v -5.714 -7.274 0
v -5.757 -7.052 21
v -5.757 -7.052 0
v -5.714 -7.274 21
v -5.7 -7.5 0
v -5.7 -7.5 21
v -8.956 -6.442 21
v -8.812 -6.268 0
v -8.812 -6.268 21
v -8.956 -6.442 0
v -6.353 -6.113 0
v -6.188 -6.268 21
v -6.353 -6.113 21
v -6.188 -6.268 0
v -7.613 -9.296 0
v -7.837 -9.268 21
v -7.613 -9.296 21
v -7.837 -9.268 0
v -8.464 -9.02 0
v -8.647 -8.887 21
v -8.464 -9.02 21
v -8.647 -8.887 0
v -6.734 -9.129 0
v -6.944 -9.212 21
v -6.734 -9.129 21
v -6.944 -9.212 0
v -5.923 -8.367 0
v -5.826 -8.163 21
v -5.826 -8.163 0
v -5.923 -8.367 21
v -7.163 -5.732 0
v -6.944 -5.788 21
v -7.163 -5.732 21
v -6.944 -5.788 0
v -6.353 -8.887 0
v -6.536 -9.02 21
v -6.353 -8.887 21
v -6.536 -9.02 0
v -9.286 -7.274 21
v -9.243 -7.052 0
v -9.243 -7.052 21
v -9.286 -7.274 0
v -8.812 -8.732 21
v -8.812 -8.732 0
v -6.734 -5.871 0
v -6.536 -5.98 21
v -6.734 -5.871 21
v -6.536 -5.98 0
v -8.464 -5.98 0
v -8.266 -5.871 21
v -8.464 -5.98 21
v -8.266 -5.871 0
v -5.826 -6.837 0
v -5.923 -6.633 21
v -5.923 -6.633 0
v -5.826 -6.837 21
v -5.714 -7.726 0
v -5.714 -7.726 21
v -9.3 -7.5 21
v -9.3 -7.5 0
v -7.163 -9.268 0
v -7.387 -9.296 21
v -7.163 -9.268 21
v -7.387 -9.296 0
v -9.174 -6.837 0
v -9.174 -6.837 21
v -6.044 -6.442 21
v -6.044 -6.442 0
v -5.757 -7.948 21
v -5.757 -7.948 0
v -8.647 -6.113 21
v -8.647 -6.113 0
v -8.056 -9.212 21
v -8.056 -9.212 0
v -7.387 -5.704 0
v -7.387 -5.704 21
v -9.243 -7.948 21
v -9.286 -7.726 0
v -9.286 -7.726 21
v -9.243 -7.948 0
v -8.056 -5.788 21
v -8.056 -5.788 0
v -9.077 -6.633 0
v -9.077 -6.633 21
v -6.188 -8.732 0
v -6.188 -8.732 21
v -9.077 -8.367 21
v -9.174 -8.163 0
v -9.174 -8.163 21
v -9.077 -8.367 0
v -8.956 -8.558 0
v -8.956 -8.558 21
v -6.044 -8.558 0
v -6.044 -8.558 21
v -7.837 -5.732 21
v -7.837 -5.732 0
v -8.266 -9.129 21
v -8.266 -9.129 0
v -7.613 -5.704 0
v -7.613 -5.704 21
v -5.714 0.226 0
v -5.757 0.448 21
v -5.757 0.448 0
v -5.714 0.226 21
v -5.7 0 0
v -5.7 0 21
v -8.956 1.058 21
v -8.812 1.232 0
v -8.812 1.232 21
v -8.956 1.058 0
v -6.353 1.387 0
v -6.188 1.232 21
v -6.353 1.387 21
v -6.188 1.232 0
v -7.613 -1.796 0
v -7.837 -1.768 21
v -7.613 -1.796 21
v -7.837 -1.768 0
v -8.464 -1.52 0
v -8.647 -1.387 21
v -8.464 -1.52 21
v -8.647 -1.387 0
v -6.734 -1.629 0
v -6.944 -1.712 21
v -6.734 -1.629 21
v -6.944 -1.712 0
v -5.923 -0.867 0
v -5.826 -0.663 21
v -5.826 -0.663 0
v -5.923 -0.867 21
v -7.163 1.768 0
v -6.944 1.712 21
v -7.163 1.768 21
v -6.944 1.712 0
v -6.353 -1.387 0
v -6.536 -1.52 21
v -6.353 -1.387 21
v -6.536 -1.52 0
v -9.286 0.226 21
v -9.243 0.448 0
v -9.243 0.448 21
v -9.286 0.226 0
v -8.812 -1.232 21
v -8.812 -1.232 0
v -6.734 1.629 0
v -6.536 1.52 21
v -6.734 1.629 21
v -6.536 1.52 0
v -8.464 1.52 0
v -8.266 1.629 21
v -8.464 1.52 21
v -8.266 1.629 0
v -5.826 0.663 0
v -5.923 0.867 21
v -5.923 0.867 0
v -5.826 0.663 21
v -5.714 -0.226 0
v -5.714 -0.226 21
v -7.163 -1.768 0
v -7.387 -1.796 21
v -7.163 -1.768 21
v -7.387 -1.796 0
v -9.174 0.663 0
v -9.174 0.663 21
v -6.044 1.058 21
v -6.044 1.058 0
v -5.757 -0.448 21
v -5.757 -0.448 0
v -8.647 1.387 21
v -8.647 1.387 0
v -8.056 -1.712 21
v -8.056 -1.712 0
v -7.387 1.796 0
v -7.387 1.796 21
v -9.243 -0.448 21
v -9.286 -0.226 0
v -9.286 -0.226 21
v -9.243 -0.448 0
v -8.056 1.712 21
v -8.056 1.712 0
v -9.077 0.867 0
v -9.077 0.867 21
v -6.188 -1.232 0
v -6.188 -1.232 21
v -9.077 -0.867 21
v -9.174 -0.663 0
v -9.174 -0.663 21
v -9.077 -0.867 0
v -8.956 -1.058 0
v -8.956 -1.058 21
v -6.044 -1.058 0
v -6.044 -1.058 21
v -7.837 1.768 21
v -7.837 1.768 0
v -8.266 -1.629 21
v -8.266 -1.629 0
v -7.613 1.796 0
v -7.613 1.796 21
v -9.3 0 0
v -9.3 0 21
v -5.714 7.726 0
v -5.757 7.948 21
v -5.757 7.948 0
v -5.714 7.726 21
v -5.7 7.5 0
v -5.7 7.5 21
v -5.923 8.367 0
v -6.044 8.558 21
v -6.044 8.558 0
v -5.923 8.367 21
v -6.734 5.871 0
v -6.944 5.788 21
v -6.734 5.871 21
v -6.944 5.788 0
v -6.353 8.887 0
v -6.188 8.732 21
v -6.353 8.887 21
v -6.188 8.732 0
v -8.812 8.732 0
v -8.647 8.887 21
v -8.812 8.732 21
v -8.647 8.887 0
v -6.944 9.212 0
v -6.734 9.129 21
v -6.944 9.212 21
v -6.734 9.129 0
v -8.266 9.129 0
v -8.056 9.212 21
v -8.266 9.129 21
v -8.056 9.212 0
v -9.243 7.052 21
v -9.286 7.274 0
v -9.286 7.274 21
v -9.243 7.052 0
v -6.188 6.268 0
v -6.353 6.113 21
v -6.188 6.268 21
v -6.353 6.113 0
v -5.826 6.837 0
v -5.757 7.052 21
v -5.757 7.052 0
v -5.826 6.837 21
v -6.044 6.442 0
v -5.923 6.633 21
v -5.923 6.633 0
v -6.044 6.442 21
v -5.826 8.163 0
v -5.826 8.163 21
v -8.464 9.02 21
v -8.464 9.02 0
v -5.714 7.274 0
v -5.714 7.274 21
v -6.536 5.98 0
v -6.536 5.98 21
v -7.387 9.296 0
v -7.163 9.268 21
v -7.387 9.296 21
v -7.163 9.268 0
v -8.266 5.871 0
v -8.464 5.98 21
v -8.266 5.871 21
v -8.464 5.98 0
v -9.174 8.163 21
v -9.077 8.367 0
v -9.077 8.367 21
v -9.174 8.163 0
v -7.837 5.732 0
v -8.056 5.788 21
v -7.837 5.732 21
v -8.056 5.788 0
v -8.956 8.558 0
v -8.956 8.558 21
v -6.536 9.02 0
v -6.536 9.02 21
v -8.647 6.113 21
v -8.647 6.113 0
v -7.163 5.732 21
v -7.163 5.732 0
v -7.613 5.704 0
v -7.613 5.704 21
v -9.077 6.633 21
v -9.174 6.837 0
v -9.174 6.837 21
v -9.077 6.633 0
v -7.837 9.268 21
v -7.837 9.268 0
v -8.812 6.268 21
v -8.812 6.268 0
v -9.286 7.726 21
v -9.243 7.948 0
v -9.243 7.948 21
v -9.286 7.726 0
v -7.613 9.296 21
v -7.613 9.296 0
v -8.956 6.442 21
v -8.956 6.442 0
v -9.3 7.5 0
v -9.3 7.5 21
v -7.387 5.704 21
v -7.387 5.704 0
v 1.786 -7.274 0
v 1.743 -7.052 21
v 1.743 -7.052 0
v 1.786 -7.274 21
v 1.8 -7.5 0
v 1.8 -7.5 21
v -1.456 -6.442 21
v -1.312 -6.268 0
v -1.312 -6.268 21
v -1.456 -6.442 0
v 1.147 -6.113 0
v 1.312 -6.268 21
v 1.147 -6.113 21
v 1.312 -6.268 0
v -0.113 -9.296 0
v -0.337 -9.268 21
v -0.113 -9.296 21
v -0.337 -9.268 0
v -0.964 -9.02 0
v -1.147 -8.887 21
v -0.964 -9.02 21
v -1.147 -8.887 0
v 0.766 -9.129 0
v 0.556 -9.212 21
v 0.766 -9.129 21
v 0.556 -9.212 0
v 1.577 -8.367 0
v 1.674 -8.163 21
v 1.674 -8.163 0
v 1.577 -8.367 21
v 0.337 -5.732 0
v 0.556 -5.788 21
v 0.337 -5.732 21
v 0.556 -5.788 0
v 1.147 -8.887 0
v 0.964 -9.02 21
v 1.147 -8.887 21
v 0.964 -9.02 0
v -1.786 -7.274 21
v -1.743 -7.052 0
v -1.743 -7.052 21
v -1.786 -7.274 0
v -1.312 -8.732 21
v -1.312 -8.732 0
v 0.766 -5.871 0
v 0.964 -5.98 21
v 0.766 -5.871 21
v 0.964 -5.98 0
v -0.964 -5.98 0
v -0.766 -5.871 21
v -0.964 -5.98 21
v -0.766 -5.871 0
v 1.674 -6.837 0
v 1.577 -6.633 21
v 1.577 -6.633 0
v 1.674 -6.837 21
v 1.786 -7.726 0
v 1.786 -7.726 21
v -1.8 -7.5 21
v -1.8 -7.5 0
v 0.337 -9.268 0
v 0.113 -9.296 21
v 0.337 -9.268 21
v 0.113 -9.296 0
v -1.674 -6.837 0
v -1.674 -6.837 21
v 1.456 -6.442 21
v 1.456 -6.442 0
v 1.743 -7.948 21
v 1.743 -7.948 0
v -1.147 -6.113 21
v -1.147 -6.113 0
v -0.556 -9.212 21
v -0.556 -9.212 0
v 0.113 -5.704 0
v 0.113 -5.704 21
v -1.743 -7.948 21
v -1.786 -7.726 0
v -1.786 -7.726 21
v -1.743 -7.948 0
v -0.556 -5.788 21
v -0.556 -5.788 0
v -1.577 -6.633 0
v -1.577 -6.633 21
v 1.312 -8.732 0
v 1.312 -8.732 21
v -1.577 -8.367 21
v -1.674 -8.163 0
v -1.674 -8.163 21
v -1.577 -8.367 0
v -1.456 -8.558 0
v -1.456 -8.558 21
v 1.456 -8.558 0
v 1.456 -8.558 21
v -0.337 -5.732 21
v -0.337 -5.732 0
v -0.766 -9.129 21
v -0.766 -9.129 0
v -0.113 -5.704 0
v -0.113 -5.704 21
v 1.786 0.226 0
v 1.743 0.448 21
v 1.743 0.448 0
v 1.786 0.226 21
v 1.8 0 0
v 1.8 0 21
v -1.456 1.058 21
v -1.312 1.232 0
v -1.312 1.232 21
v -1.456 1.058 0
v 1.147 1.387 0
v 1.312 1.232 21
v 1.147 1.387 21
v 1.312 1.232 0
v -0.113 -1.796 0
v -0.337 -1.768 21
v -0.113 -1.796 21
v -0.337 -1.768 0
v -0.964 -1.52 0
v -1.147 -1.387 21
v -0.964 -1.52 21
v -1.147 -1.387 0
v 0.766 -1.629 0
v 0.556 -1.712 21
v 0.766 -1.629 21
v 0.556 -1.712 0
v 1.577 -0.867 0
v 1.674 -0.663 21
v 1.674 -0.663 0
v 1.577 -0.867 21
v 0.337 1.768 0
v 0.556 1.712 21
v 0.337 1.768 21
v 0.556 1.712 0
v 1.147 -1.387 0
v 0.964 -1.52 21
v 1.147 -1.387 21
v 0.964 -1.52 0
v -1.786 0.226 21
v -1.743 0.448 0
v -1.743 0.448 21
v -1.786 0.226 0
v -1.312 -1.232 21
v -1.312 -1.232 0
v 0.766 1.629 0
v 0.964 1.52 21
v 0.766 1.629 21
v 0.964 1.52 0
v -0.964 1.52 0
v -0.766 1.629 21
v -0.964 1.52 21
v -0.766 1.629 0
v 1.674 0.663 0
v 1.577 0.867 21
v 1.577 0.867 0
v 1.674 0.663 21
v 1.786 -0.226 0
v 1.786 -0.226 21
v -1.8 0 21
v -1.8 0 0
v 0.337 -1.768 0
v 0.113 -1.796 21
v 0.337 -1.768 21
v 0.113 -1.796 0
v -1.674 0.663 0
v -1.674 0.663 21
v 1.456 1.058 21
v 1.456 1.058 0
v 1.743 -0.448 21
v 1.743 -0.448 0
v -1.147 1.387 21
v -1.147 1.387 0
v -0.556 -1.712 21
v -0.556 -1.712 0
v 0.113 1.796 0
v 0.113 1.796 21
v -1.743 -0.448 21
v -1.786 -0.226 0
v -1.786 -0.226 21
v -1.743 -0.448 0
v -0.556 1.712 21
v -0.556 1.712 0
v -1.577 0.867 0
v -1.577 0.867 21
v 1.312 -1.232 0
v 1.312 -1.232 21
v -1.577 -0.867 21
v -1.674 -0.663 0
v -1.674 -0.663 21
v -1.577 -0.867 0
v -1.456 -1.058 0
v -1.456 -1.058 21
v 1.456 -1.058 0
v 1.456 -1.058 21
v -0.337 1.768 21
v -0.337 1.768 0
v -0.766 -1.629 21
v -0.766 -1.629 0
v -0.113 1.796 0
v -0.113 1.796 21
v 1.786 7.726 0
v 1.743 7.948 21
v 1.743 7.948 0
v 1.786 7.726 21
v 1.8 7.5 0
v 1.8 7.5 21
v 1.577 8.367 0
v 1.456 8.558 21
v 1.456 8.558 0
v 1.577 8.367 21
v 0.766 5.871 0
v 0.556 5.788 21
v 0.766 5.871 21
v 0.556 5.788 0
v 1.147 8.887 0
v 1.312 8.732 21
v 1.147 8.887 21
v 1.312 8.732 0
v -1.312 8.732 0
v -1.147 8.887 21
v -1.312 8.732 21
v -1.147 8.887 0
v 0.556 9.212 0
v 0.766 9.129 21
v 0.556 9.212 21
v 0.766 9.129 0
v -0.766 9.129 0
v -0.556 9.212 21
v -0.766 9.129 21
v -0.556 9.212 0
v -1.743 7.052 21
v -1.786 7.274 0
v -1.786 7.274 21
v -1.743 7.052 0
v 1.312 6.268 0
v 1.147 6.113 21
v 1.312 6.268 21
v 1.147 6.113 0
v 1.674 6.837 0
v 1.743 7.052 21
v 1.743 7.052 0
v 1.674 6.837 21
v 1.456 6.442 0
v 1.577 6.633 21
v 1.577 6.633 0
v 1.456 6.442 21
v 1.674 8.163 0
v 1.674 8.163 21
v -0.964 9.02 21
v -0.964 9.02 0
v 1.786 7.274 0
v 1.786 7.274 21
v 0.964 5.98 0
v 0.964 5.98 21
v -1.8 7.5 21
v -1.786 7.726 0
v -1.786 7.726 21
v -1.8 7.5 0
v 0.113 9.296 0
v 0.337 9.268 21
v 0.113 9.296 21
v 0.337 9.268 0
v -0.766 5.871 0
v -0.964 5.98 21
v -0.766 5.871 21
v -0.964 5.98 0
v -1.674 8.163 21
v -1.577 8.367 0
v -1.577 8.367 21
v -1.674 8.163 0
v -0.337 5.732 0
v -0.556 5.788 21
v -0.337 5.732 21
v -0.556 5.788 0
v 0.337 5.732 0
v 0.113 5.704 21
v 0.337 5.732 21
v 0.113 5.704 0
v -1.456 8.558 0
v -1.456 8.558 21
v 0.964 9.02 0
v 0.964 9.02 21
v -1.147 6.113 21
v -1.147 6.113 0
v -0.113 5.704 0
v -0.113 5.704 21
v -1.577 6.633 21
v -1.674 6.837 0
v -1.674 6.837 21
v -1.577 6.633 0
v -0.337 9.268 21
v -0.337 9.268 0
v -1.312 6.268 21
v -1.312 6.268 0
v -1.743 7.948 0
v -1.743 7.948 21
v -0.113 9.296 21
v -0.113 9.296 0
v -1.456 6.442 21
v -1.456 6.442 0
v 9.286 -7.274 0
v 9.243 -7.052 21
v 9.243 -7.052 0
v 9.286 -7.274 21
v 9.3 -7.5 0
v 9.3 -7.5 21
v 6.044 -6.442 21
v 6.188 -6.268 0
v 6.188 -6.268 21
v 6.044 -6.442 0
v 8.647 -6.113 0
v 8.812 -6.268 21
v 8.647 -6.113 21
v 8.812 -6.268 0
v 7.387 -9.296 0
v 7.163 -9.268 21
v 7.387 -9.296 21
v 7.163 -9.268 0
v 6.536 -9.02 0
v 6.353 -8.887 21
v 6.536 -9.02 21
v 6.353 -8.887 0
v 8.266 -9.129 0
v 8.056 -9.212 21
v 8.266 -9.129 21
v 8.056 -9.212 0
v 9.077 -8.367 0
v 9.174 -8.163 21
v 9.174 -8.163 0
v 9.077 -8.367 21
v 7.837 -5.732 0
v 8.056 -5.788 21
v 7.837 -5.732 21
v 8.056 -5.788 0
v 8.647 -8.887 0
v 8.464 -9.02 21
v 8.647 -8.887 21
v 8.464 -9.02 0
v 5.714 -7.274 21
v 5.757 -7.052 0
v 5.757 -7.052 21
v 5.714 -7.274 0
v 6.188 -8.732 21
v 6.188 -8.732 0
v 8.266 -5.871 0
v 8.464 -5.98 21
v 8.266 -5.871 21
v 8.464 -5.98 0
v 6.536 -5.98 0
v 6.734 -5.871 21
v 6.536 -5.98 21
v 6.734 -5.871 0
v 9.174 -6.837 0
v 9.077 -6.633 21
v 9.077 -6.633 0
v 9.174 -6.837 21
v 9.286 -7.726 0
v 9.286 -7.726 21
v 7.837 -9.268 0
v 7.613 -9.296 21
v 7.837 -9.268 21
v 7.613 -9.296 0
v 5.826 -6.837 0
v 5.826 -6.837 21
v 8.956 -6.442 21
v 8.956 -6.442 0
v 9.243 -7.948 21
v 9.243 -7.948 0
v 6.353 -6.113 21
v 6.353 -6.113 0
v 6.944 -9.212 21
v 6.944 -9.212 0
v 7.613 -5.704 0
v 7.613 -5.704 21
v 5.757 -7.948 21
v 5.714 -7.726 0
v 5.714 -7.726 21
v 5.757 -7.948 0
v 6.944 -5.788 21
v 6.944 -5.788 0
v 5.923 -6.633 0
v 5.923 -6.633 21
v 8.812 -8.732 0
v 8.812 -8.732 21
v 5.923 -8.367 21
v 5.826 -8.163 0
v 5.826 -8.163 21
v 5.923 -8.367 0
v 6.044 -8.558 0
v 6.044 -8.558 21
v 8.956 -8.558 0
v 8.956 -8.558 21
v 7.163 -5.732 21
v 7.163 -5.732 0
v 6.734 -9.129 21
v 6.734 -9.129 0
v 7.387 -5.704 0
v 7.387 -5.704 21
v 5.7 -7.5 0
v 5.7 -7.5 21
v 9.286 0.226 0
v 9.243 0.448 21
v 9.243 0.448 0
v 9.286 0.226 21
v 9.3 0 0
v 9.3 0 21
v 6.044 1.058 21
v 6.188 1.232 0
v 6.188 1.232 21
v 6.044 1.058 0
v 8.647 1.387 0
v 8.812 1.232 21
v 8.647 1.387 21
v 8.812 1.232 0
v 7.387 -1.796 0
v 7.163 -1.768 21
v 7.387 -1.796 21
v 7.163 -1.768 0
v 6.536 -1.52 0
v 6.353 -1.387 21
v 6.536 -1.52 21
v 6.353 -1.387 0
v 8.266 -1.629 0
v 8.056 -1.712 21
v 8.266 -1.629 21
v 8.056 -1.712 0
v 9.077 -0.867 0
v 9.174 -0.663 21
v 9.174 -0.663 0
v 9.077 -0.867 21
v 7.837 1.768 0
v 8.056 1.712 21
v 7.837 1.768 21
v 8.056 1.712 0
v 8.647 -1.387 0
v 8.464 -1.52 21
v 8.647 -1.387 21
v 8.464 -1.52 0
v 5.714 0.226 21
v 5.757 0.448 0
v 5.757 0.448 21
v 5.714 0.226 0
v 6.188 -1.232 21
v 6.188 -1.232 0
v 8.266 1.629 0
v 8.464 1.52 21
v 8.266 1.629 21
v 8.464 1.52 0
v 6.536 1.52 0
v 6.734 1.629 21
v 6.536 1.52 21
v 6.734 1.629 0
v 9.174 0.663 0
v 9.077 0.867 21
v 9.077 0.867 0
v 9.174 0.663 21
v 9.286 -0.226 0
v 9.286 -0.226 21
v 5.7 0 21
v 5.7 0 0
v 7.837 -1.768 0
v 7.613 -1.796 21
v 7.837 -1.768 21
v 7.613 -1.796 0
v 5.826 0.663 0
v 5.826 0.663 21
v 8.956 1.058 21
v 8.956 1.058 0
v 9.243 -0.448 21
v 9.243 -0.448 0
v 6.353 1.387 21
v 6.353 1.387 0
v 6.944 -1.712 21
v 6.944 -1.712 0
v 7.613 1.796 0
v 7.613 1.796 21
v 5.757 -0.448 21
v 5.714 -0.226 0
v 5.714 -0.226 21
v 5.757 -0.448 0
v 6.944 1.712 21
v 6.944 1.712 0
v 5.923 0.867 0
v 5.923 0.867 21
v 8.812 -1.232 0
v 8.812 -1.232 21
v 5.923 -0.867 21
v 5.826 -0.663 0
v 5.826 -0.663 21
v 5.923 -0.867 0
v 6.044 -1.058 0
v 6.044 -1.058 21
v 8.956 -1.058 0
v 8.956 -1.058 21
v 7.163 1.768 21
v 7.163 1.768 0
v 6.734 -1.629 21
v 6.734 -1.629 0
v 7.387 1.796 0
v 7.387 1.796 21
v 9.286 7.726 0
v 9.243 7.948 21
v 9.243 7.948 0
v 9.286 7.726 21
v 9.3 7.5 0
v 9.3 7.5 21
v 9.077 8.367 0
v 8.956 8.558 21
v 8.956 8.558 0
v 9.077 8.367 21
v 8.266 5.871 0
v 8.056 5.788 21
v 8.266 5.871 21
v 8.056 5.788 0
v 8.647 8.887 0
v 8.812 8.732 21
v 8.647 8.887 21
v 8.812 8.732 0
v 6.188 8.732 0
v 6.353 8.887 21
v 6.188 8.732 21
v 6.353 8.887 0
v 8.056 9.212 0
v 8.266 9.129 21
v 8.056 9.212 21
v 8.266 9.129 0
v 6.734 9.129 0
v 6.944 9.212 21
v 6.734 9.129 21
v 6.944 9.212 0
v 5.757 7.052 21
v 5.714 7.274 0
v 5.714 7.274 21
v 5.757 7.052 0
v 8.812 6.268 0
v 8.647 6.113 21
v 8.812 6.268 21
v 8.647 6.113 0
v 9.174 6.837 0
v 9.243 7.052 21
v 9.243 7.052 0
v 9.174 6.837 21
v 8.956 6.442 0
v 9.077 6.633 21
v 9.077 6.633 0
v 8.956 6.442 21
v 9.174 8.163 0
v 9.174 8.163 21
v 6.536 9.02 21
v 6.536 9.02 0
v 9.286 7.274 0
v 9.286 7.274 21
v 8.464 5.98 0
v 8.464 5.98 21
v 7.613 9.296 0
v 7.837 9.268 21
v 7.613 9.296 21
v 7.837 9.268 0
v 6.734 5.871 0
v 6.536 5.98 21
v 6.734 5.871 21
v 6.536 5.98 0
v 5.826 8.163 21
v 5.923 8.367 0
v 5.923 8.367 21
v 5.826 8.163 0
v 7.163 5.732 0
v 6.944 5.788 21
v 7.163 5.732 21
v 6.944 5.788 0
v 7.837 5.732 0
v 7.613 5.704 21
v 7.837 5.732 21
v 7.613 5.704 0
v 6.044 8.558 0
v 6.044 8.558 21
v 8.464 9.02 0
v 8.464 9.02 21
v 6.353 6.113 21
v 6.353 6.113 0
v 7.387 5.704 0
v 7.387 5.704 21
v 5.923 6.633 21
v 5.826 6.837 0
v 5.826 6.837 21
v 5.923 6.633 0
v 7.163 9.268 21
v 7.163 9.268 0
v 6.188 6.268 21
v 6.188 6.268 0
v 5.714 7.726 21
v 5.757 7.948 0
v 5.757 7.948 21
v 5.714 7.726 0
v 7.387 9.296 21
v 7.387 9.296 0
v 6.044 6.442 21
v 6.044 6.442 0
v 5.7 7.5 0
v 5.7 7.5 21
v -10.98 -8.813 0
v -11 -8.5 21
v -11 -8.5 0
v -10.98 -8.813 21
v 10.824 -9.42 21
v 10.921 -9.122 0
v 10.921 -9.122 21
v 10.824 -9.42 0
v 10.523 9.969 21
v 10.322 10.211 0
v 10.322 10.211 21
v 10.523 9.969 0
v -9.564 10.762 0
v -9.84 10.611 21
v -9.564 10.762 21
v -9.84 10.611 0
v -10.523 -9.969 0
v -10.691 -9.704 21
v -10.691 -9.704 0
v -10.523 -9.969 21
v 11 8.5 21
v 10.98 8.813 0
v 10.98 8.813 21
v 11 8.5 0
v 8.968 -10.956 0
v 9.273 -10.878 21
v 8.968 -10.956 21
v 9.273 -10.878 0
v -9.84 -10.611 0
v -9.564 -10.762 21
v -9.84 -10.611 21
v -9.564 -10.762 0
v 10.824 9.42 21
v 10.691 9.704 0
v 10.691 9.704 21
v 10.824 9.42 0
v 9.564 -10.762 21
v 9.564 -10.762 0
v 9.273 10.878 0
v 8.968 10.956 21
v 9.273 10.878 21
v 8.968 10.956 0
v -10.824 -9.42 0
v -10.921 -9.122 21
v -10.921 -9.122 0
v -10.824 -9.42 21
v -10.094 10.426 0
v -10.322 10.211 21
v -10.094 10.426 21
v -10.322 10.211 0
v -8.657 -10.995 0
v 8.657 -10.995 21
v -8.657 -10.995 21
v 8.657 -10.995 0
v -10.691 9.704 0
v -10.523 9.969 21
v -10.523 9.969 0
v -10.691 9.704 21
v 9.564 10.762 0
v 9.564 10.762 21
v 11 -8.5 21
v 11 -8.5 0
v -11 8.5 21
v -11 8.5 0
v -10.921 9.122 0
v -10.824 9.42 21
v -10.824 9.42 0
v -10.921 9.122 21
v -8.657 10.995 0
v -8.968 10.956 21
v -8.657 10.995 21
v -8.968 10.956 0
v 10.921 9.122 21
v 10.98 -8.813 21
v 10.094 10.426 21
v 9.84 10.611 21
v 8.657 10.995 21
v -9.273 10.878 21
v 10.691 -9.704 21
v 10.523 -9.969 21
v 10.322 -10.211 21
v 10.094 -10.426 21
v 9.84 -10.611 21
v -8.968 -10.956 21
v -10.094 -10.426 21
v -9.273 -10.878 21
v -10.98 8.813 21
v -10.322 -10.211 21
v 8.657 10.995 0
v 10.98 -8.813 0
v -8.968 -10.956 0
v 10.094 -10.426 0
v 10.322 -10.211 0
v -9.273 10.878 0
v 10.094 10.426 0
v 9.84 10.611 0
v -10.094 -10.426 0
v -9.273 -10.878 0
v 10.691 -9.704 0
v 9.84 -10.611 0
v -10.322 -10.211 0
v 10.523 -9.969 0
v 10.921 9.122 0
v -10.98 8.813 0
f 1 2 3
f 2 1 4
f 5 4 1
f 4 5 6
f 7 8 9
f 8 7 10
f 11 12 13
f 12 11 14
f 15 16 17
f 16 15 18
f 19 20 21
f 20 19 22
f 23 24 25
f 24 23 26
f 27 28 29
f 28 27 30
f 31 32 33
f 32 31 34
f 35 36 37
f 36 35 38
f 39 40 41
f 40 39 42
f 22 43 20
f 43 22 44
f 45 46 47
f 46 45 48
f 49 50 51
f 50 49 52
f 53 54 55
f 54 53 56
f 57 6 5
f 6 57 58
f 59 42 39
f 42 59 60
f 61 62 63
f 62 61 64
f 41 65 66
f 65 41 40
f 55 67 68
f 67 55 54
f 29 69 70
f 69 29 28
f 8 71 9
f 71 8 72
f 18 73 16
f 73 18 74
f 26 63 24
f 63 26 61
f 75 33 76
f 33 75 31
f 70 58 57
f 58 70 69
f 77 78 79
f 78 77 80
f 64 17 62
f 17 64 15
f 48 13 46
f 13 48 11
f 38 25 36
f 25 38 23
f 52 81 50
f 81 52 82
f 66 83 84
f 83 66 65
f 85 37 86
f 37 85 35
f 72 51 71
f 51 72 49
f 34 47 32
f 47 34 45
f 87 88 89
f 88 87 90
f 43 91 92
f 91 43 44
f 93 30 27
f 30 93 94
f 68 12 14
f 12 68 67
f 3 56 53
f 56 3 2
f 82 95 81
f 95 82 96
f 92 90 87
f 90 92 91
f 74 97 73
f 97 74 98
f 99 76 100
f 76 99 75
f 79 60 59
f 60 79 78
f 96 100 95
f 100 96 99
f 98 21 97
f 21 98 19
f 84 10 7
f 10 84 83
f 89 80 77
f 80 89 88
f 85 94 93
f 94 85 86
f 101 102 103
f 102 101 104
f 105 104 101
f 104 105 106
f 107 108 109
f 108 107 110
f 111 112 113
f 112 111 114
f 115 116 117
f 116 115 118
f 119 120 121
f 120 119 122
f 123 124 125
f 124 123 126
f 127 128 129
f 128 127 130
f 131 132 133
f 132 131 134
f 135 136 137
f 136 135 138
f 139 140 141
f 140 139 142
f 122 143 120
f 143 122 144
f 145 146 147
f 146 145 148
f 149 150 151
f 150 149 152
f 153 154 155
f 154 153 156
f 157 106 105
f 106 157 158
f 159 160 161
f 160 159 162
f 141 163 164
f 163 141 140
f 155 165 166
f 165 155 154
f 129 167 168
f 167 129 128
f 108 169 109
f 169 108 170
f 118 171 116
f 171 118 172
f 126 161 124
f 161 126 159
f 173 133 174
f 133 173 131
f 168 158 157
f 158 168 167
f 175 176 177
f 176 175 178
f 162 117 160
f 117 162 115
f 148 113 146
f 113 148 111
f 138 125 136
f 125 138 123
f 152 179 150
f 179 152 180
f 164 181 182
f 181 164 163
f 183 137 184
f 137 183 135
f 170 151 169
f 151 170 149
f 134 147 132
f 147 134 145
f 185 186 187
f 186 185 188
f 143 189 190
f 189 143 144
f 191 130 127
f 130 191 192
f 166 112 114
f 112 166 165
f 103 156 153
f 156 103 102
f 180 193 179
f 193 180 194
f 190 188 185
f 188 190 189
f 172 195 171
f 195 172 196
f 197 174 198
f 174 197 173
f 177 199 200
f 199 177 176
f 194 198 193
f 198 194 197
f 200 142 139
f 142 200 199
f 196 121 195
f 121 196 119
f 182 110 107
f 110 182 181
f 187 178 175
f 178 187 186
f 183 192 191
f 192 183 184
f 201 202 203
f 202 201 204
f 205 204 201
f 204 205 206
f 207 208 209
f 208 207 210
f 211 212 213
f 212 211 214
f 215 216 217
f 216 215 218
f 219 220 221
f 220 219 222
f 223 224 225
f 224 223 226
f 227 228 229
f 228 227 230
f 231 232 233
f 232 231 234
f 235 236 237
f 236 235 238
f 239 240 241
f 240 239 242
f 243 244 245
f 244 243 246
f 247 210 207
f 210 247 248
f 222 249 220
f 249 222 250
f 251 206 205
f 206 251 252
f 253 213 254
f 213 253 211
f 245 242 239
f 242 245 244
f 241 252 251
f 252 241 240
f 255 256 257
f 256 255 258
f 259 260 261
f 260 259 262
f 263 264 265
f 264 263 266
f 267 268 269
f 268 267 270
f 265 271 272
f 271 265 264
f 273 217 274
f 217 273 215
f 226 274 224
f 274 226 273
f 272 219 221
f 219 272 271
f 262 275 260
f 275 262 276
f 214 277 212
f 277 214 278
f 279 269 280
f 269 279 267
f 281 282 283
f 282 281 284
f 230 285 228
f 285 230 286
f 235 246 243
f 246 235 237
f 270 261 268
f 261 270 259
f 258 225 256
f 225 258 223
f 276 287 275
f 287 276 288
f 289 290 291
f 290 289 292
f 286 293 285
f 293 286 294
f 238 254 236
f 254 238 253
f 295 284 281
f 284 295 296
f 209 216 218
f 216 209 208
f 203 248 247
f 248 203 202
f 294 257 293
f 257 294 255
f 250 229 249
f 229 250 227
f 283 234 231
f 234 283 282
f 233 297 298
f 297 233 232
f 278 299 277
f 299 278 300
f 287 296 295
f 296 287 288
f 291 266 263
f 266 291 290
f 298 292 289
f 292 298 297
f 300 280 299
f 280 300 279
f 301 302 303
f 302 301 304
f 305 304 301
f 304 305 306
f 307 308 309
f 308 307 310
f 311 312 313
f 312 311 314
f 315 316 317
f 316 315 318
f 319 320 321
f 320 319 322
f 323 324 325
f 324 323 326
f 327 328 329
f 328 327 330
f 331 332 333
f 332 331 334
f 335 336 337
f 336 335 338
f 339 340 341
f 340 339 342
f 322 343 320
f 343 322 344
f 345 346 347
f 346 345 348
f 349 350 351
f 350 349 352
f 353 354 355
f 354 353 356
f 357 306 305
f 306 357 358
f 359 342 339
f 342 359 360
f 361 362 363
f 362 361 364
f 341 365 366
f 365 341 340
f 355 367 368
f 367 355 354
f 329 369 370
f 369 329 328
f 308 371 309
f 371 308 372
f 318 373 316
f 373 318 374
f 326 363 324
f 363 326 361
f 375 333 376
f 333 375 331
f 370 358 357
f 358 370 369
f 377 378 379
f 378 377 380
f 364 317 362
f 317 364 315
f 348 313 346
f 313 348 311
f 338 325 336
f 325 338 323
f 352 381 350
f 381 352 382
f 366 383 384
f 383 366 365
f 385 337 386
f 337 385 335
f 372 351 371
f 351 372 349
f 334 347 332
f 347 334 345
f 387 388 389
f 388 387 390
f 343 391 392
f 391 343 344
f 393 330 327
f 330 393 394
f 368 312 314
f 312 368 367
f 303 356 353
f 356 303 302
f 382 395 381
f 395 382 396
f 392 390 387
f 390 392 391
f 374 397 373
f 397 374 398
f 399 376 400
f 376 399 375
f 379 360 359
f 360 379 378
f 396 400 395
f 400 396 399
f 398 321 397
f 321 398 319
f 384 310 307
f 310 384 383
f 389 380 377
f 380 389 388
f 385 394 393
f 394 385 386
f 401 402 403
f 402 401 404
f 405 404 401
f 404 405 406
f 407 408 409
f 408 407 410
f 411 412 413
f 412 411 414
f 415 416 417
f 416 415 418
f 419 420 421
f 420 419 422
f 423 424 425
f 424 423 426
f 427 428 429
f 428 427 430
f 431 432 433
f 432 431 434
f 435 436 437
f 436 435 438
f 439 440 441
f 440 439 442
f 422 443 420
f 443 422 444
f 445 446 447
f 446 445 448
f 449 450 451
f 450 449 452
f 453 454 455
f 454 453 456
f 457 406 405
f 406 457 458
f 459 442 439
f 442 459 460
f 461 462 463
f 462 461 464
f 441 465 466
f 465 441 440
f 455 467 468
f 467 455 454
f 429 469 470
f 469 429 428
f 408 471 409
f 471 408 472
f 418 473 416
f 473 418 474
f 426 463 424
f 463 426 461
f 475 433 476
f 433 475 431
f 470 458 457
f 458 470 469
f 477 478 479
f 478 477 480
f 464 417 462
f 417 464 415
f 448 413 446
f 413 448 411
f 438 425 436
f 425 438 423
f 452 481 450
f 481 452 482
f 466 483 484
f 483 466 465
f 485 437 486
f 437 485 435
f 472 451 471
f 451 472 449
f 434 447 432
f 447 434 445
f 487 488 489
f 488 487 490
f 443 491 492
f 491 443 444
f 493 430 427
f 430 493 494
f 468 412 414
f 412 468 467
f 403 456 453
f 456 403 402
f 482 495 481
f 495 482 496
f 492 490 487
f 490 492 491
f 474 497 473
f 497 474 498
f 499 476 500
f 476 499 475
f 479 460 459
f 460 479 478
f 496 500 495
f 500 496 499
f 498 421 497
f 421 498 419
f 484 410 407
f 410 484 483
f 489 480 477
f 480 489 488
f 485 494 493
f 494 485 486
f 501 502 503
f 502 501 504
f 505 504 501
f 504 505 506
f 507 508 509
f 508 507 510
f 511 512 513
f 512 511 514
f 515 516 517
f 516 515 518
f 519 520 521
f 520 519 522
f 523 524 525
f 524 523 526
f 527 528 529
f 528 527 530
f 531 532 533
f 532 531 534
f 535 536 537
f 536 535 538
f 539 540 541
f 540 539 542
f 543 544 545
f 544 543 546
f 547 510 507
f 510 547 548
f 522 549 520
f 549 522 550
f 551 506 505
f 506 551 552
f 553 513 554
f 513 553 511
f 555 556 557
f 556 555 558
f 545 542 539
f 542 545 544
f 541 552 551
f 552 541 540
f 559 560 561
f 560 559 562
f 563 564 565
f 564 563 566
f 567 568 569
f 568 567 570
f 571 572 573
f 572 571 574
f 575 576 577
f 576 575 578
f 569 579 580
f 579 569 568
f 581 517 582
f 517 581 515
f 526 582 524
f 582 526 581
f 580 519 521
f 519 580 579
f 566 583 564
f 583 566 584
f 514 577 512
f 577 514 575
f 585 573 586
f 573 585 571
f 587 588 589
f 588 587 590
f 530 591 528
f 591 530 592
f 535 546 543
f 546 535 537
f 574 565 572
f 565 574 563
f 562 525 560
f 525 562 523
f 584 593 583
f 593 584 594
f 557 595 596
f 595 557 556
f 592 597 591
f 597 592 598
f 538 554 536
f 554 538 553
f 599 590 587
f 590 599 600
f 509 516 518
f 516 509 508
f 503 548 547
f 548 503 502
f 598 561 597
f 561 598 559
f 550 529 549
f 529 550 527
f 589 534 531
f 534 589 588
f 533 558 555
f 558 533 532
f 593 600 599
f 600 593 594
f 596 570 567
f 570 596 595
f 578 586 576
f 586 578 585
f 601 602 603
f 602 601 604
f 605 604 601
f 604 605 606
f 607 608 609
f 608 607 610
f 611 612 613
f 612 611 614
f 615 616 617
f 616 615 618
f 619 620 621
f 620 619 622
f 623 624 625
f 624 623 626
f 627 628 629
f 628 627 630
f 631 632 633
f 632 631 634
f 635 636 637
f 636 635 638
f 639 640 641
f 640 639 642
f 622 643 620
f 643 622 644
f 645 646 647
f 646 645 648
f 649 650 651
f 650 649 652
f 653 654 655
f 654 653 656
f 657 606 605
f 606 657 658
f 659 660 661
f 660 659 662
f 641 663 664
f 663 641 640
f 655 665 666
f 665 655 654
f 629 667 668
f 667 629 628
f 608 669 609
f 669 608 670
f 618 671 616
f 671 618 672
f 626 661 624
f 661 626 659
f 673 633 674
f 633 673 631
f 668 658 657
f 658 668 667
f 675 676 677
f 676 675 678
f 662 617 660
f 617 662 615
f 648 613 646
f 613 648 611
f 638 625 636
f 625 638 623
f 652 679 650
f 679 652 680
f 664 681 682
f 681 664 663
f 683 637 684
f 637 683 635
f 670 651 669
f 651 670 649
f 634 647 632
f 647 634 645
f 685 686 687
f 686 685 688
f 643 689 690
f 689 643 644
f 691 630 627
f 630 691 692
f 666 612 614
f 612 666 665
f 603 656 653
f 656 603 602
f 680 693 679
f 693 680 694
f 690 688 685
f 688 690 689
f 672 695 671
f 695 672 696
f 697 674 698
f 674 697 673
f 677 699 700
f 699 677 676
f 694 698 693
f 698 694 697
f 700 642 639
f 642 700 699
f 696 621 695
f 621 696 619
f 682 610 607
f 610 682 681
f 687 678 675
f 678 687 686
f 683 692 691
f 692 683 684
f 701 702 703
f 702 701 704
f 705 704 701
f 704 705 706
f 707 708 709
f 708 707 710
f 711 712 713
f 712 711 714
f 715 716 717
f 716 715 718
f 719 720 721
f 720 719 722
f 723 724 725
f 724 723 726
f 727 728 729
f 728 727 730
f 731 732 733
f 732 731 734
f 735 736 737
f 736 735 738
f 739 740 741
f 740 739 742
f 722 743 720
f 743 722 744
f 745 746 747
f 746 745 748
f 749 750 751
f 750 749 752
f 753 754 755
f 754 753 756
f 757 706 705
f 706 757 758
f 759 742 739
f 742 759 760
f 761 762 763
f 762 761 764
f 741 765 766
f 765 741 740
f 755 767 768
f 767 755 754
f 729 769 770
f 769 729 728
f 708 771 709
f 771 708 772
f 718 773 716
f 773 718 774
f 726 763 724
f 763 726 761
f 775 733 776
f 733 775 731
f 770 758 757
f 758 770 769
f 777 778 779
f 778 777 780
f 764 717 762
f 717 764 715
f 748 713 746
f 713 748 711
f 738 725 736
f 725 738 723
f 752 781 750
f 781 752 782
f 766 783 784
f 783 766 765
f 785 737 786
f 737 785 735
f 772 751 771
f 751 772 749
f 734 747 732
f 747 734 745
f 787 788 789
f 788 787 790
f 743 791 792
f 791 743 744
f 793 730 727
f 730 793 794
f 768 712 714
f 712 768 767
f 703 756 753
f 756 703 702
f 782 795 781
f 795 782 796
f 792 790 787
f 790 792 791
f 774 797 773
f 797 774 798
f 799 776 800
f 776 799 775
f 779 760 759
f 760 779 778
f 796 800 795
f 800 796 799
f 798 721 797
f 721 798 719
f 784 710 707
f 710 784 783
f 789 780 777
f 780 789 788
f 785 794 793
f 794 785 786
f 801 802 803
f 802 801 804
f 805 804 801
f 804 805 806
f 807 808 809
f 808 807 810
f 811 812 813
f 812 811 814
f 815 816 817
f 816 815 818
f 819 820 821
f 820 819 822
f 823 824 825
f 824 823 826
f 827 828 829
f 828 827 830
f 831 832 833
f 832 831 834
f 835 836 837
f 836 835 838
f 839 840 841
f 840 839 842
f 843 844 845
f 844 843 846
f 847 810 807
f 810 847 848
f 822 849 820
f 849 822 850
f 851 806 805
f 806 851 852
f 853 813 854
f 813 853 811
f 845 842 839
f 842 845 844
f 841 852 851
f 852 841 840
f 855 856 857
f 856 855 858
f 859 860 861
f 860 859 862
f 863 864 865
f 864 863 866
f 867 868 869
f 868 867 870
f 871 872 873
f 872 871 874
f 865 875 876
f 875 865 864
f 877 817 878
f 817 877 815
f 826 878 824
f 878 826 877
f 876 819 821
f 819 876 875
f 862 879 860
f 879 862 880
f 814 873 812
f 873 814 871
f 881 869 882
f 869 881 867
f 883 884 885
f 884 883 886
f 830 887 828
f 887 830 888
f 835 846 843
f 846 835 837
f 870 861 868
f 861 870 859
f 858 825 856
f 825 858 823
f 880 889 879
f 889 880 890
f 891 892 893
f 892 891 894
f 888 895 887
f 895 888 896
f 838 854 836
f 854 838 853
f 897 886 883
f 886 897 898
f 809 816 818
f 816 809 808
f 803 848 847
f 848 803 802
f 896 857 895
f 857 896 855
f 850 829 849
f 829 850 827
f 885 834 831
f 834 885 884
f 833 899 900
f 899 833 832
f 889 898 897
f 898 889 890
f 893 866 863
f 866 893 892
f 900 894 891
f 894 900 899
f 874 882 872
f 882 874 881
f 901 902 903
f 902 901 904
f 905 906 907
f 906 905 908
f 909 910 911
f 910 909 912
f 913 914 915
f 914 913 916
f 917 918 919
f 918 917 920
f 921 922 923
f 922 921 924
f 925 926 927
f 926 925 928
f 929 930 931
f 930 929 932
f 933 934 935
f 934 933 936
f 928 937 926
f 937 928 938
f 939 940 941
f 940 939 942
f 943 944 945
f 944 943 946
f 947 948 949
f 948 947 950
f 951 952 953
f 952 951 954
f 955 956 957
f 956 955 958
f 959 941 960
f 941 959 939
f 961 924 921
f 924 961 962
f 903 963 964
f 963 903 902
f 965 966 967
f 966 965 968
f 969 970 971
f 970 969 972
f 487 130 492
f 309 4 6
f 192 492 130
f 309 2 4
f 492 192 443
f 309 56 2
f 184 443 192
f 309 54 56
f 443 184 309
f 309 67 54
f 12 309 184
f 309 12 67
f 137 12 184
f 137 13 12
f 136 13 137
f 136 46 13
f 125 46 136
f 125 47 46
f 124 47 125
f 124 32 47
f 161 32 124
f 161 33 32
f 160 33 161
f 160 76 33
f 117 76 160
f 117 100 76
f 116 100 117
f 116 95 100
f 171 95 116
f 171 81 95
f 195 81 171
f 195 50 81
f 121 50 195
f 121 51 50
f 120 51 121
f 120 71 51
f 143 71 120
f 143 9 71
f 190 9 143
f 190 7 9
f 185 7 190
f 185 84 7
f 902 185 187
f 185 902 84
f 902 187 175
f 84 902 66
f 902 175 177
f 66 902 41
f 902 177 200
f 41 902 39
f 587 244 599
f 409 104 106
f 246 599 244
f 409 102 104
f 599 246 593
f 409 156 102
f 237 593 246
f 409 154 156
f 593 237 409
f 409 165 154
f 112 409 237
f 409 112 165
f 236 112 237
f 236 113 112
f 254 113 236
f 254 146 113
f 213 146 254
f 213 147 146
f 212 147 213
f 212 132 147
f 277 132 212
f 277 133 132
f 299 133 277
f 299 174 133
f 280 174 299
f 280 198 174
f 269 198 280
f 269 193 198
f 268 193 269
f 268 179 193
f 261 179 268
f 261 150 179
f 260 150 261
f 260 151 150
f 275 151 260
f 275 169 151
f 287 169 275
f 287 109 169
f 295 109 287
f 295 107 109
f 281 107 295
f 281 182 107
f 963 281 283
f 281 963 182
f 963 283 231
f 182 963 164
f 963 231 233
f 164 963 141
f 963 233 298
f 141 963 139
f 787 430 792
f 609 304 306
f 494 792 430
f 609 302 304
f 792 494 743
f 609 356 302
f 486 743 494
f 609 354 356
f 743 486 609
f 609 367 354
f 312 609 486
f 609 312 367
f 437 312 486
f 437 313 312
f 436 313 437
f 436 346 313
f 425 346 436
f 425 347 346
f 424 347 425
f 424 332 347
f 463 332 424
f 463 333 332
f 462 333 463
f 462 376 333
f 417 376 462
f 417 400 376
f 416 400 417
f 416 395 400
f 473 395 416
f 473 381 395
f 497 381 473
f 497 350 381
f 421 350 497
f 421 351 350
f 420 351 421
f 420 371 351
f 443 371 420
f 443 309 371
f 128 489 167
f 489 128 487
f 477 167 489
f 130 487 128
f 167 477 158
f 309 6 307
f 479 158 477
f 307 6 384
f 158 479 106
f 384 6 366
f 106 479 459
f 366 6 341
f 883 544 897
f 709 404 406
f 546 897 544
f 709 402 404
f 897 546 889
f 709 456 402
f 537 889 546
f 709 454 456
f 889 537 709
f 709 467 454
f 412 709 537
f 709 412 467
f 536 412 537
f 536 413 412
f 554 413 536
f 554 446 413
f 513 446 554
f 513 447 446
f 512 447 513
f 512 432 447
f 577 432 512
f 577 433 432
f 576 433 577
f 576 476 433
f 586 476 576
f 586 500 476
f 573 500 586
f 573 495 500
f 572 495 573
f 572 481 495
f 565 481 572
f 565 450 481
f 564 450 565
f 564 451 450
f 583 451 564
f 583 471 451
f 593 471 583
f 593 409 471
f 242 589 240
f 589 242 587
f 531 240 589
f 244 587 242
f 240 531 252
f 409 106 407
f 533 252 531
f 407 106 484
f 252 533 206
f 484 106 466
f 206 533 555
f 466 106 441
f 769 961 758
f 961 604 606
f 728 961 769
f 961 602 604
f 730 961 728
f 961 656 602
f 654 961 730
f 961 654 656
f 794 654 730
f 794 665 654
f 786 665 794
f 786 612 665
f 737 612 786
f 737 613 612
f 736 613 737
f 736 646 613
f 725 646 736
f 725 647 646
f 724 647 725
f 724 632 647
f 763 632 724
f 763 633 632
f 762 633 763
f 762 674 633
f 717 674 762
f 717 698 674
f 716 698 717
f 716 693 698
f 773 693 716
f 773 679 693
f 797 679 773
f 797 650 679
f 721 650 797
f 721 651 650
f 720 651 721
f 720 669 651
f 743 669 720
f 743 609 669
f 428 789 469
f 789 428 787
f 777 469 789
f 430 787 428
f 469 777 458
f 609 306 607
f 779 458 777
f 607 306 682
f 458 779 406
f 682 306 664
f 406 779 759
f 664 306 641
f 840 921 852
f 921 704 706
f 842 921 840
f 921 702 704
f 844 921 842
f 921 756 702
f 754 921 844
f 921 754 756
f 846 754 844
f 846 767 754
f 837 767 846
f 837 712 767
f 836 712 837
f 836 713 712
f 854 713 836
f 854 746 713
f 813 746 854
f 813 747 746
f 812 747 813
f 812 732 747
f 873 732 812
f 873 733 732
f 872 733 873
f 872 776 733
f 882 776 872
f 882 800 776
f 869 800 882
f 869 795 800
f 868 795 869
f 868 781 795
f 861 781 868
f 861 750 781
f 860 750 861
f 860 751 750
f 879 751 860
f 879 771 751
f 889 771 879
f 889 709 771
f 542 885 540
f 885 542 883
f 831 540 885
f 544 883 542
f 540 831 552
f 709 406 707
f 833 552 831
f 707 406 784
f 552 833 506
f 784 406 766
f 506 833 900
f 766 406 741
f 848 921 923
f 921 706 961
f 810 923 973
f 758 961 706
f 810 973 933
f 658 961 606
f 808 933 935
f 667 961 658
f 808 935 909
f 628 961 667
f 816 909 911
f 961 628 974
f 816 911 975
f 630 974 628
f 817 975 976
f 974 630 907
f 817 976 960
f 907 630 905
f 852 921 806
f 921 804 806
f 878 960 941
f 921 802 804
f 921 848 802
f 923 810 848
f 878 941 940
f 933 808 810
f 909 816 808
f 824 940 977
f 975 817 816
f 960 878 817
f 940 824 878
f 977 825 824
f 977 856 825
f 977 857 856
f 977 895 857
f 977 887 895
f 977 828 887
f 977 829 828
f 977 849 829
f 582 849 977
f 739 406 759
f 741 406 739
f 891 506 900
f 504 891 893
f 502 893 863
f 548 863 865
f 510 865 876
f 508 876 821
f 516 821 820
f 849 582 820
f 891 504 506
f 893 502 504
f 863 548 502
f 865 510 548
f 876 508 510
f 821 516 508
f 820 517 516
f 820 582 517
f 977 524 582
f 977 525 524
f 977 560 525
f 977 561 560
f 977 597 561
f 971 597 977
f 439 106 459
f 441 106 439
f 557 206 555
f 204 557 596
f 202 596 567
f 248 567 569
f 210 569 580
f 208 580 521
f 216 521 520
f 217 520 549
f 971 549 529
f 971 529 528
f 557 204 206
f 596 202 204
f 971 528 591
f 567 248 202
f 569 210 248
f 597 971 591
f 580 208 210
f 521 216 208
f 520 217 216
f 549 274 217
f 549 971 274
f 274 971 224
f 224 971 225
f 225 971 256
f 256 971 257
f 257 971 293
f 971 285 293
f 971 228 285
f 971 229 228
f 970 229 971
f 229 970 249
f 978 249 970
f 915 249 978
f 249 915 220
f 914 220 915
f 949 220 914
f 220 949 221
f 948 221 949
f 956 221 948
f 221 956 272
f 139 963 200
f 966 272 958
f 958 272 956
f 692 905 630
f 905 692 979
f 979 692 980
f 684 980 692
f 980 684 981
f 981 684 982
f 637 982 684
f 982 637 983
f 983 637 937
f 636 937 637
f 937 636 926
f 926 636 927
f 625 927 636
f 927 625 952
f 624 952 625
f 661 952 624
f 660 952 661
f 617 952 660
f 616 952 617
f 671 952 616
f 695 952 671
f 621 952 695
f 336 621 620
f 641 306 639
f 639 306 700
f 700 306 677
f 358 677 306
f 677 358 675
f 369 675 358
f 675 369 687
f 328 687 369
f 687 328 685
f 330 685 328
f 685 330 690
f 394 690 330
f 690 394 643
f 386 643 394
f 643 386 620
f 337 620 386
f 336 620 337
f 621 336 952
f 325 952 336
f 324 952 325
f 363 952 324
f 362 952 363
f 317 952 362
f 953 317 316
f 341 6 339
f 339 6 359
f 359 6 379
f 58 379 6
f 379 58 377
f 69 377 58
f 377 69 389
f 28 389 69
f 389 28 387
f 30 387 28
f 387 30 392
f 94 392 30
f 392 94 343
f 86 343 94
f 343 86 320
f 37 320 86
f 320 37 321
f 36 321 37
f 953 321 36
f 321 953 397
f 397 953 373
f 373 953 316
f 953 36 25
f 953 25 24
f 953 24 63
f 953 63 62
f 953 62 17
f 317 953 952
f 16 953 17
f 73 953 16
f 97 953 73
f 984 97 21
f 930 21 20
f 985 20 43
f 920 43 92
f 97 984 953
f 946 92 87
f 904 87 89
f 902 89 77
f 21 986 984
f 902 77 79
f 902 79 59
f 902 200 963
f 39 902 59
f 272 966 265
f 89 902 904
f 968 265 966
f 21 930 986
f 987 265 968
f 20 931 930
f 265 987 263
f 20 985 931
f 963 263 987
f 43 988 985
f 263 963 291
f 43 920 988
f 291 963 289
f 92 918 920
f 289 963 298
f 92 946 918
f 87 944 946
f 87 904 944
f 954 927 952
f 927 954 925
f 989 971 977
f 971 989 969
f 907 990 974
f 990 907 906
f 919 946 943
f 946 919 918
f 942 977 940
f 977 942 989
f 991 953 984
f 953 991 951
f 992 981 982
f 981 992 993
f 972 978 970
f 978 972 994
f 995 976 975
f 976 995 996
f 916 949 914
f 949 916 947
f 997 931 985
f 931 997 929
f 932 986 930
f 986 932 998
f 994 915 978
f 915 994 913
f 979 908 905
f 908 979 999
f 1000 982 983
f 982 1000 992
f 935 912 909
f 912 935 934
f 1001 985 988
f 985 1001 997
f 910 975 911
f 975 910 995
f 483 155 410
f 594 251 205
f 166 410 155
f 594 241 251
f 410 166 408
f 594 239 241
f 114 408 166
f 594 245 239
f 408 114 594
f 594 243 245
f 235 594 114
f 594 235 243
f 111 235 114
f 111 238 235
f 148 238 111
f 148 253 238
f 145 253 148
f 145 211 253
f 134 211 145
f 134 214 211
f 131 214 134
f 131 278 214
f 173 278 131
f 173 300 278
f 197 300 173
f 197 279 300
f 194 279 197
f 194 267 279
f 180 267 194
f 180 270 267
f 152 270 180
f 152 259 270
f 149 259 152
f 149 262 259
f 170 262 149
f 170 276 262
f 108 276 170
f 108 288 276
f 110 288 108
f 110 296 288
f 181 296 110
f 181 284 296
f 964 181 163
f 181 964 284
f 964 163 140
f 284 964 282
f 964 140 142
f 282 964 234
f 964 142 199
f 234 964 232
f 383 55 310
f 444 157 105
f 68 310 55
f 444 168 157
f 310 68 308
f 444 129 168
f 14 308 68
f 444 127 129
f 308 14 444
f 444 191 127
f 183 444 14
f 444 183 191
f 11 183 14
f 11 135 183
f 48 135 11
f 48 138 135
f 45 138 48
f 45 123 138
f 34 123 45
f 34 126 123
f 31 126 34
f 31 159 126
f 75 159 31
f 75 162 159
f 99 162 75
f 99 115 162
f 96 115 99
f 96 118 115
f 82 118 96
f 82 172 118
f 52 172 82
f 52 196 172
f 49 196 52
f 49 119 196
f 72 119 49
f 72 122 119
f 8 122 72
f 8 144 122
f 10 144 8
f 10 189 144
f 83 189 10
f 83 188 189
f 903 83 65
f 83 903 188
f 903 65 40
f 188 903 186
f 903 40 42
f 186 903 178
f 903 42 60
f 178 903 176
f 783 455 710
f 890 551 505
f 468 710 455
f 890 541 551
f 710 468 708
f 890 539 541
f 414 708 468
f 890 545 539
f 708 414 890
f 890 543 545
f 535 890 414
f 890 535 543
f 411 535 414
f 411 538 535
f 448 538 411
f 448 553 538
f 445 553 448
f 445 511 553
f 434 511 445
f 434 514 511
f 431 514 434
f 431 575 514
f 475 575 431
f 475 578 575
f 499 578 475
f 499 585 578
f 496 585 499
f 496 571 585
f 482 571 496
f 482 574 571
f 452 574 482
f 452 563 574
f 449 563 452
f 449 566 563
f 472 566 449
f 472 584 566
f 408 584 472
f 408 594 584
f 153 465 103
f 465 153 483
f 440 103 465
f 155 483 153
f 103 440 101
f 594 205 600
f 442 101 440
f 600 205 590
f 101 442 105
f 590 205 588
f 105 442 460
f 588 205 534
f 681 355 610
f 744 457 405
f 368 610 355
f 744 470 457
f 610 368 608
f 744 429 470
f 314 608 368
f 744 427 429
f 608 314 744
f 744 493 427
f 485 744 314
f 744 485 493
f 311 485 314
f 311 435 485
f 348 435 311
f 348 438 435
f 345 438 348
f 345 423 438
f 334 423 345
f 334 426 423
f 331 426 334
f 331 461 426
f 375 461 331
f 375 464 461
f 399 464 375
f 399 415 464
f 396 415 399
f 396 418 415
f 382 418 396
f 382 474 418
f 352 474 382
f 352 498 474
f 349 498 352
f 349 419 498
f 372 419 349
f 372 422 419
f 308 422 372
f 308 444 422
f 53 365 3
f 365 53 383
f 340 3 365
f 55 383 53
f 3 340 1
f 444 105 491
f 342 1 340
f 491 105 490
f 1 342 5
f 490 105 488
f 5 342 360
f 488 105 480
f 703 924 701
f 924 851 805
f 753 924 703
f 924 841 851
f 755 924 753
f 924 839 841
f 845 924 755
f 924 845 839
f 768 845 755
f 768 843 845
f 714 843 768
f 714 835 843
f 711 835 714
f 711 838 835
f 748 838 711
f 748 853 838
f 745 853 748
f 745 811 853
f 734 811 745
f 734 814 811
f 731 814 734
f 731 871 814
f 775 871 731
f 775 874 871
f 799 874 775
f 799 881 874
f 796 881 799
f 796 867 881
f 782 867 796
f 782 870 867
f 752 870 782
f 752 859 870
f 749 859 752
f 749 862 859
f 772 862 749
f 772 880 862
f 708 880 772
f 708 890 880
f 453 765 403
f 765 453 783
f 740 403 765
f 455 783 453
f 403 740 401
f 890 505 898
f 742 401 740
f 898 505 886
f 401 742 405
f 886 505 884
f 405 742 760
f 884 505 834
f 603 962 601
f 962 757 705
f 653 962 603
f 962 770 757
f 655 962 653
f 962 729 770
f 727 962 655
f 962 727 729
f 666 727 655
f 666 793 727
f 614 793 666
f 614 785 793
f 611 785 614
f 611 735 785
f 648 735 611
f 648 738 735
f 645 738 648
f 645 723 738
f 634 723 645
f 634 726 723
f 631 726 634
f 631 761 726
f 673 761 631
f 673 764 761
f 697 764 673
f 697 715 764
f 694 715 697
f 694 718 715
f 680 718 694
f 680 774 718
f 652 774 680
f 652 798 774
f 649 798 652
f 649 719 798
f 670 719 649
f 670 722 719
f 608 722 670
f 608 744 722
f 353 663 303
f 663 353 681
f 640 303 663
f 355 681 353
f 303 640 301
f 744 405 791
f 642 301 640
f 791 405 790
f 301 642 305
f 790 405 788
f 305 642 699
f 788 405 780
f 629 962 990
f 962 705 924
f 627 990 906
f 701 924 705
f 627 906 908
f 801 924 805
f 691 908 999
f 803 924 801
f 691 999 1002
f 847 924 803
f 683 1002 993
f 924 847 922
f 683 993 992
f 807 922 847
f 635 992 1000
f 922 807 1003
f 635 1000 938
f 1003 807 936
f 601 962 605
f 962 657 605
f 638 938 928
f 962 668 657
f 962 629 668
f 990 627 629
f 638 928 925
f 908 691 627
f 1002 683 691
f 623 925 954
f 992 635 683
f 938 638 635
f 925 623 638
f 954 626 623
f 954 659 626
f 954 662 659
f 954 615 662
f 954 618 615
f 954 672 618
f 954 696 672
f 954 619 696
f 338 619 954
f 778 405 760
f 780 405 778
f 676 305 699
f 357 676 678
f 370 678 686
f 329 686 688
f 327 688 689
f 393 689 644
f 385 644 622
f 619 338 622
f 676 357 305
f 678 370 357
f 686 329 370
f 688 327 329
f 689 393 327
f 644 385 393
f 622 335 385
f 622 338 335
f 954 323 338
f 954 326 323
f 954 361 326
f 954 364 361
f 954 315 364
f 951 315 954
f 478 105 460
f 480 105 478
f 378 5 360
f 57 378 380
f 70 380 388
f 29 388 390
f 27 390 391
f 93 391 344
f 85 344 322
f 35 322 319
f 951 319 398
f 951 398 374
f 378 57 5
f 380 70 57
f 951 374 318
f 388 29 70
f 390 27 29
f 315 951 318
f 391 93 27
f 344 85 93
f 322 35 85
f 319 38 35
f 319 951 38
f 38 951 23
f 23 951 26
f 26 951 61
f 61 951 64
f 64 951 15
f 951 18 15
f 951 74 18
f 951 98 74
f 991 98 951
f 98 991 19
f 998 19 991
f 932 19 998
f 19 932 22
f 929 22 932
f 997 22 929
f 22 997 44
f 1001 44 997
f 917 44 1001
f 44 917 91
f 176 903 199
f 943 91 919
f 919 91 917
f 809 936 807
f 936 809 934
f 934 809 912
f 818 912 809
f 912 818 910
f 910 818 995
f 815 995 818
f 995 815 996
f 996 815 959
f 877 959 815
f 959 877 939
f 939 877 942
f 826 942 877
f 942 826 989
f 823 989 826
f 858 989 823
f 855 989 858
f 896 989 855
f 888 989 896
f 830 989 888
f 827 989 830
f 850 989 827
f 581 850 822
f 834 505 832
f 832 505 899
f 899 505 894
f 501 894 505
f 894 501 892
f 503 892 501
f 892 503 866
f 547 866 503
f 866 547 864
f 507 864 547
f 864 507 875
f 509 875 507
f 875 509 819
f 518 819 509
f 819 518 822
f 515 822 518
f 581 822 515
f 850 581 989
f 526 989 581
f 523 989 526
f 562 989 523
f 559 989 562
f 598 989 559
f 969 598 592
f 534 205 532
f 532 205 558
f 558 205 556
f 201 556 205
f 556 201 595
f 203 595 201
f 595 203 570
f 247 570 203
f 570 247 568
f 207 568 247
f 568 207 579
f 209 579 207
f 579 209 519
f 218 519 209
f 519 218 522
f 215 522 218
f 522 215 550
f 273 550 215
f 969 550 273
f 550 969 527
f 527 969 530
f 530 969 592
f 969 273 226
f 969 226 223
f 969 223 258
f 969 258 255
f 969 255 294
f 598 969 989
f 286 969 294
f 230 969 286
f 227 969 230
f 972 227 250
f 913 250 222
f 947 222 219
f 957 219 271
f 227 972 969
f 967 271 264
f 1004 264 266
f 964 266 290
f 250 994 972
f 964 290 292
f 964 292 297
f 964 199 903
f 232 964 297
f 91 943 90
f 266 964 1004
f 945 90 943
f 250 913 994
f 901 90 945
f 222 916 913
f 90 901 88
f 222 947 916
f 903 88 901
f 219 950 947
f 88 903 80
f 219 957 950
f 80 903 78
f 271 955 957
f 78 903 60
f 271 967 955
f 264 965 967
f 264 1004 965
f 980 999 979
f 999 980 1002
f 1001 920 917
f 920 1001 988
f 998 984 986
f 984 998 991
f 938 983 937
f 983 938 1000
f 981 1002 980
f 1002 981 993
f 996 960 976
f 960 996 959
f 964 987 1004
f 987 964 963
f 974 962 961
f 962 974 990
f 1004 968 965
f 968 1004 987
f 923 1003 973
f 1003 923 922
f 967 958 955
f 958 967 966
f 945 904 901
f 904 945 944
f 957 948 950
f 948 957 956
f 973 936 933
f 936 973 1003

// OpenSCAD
$fn = 50;


difference() {
	union() {
		translate(v = [0, 0, 0]) {
			rotate(a = [0, 0, 0]) {
				hull() {
					translate(v = [-8.5000000000, 8.5000000000, 0]) {
						rotate(a = [0, 0, 0]) {
							translate(v = [0, 0, 0]) {
								rotate(a = [0, 0, 0]) {
									cylinder(h = 21, r = 2.5000000000);
								}
							}
						}
					}
					translate(v = [8.5000000000, 8.5000000000, 0]) {
						rotate(a = [0, 0, 0]) {
							translate(v = [0, 0, 0]) {
								rotate(a = [0, 0, 0]) {
									cylinder(h = 21, r = 2.5000000000);
								}
							}
						}
					}
					translate(v = [-8.5000000000, -8.5000000000, 0]) {
						rotate(a = [0, 0, 0]) {
							translate(v = [0, 0, 0]) {
								rotate(a = [0, 0, 0]) {
									cylinder(h = 21, r = 2.5000000000);
								}
							}
						}
					}
					translate(v = [8.5000000000, -8.5000000000, 0]) {
						rotate(a = [0, 0, 0]) {
							translate(v = [0, 0, 0]) {
								rotate(a = [0, 0, 0]) {
									cylinder(h = 21, r = 2.5000000000);
								}
							}
						}
					}
				}
			}
		}
	}
	union() {
		translate(v = [-7.5000000000, -7.5000000000, 0]) {
			rotate(a = [0, 0, 0]) {
				translate(v = [0, 0, -50]) {
					rotate(a = [0, 0, 0]) {
						cylinder(h = 100, r = 1.8000000000);
					}
				}
			}
		}
		translate(v = [-7.5000000000, 0.0000000000, 0]) {
			rotate(a = [0, 0, 0]) {
				translate(v = [0, 0, -50]) {
					rotate(a = [0, 0, 0]) {
						cylinder(h = 100, r = 1.8000000000);
					}
				}
			}
		}
		translate(v = [-7.5000000000, 7.5000000000, 0]) {
			rotate(a = [0, 0, 0]) {
				translate(v = [0, 0, -50]) {
					rotate(a = [0, 0, 0]) {
						cylinder(h = 100, r = 1.8000000000);
					}
				}
			}
		}
		translate(v = [0.0000000000, -7.5000000000, 0]) {
			rotate(a = [0, 0, 0]) {
				translate(v = [0, 0, -50]) {
					rotate(a = [0, 0, 0]) {
						cylinder(h = 100, r = 1.8000000000);
					}
				}
			}
		}
		translate(v = [0.0000000000, 0.0000000000, 0]) {
			rotate(a = [0, 0, 0]) {
				translate(v = [0, 0, -50]) {
					rotate(a = [0, 0, 0]) {
						cylinder(h = 100, r = 1.8000000000);
					}
				}
			}
		}
		translate(v = [0.0000000000, 7.5000000000, 0]) {
			rotate(a = [0, 0, 0]) {
				translate(v = [0, 0, -50]) {
					rotate(a = [0, 0, 0]) {
						cylinder(h = 100, r = 1.8000000000);
					}
				}
			}
		}
		translate(v = [7.5000000000, -7.5000000000, 0]) {
			rotate(a = [0, 0, 0]) {
				translate(v = [0, 0, -50]) {
					rotate(a = [0, 0, 0]) {
						cylinder(h = 100, r = 1.8000000000);
					}
				}
			}
		}
		translate(v = [7.5000000000, 0.0000000000, 0]) {
			rotate(a = [0, 0, 0]) {
				translate(v = [0, 0, -50]) {
					rotate(a = [0, 0, 0]) {
						cylinder(h = 100, r = 1.8000000000);
					}
				}
			}
		}
		translate(v = [7.5000000000, 7.5000000000, 0]) {
			rotate(a = [0, 0, 0]) {
				translate(v = [0, 0, -50]) {
					rotate(a = [0, 0, 0]) {
						cylinder(h = 100, r = 1.8000000000);
					}
				}
			}
		}
	}
}
